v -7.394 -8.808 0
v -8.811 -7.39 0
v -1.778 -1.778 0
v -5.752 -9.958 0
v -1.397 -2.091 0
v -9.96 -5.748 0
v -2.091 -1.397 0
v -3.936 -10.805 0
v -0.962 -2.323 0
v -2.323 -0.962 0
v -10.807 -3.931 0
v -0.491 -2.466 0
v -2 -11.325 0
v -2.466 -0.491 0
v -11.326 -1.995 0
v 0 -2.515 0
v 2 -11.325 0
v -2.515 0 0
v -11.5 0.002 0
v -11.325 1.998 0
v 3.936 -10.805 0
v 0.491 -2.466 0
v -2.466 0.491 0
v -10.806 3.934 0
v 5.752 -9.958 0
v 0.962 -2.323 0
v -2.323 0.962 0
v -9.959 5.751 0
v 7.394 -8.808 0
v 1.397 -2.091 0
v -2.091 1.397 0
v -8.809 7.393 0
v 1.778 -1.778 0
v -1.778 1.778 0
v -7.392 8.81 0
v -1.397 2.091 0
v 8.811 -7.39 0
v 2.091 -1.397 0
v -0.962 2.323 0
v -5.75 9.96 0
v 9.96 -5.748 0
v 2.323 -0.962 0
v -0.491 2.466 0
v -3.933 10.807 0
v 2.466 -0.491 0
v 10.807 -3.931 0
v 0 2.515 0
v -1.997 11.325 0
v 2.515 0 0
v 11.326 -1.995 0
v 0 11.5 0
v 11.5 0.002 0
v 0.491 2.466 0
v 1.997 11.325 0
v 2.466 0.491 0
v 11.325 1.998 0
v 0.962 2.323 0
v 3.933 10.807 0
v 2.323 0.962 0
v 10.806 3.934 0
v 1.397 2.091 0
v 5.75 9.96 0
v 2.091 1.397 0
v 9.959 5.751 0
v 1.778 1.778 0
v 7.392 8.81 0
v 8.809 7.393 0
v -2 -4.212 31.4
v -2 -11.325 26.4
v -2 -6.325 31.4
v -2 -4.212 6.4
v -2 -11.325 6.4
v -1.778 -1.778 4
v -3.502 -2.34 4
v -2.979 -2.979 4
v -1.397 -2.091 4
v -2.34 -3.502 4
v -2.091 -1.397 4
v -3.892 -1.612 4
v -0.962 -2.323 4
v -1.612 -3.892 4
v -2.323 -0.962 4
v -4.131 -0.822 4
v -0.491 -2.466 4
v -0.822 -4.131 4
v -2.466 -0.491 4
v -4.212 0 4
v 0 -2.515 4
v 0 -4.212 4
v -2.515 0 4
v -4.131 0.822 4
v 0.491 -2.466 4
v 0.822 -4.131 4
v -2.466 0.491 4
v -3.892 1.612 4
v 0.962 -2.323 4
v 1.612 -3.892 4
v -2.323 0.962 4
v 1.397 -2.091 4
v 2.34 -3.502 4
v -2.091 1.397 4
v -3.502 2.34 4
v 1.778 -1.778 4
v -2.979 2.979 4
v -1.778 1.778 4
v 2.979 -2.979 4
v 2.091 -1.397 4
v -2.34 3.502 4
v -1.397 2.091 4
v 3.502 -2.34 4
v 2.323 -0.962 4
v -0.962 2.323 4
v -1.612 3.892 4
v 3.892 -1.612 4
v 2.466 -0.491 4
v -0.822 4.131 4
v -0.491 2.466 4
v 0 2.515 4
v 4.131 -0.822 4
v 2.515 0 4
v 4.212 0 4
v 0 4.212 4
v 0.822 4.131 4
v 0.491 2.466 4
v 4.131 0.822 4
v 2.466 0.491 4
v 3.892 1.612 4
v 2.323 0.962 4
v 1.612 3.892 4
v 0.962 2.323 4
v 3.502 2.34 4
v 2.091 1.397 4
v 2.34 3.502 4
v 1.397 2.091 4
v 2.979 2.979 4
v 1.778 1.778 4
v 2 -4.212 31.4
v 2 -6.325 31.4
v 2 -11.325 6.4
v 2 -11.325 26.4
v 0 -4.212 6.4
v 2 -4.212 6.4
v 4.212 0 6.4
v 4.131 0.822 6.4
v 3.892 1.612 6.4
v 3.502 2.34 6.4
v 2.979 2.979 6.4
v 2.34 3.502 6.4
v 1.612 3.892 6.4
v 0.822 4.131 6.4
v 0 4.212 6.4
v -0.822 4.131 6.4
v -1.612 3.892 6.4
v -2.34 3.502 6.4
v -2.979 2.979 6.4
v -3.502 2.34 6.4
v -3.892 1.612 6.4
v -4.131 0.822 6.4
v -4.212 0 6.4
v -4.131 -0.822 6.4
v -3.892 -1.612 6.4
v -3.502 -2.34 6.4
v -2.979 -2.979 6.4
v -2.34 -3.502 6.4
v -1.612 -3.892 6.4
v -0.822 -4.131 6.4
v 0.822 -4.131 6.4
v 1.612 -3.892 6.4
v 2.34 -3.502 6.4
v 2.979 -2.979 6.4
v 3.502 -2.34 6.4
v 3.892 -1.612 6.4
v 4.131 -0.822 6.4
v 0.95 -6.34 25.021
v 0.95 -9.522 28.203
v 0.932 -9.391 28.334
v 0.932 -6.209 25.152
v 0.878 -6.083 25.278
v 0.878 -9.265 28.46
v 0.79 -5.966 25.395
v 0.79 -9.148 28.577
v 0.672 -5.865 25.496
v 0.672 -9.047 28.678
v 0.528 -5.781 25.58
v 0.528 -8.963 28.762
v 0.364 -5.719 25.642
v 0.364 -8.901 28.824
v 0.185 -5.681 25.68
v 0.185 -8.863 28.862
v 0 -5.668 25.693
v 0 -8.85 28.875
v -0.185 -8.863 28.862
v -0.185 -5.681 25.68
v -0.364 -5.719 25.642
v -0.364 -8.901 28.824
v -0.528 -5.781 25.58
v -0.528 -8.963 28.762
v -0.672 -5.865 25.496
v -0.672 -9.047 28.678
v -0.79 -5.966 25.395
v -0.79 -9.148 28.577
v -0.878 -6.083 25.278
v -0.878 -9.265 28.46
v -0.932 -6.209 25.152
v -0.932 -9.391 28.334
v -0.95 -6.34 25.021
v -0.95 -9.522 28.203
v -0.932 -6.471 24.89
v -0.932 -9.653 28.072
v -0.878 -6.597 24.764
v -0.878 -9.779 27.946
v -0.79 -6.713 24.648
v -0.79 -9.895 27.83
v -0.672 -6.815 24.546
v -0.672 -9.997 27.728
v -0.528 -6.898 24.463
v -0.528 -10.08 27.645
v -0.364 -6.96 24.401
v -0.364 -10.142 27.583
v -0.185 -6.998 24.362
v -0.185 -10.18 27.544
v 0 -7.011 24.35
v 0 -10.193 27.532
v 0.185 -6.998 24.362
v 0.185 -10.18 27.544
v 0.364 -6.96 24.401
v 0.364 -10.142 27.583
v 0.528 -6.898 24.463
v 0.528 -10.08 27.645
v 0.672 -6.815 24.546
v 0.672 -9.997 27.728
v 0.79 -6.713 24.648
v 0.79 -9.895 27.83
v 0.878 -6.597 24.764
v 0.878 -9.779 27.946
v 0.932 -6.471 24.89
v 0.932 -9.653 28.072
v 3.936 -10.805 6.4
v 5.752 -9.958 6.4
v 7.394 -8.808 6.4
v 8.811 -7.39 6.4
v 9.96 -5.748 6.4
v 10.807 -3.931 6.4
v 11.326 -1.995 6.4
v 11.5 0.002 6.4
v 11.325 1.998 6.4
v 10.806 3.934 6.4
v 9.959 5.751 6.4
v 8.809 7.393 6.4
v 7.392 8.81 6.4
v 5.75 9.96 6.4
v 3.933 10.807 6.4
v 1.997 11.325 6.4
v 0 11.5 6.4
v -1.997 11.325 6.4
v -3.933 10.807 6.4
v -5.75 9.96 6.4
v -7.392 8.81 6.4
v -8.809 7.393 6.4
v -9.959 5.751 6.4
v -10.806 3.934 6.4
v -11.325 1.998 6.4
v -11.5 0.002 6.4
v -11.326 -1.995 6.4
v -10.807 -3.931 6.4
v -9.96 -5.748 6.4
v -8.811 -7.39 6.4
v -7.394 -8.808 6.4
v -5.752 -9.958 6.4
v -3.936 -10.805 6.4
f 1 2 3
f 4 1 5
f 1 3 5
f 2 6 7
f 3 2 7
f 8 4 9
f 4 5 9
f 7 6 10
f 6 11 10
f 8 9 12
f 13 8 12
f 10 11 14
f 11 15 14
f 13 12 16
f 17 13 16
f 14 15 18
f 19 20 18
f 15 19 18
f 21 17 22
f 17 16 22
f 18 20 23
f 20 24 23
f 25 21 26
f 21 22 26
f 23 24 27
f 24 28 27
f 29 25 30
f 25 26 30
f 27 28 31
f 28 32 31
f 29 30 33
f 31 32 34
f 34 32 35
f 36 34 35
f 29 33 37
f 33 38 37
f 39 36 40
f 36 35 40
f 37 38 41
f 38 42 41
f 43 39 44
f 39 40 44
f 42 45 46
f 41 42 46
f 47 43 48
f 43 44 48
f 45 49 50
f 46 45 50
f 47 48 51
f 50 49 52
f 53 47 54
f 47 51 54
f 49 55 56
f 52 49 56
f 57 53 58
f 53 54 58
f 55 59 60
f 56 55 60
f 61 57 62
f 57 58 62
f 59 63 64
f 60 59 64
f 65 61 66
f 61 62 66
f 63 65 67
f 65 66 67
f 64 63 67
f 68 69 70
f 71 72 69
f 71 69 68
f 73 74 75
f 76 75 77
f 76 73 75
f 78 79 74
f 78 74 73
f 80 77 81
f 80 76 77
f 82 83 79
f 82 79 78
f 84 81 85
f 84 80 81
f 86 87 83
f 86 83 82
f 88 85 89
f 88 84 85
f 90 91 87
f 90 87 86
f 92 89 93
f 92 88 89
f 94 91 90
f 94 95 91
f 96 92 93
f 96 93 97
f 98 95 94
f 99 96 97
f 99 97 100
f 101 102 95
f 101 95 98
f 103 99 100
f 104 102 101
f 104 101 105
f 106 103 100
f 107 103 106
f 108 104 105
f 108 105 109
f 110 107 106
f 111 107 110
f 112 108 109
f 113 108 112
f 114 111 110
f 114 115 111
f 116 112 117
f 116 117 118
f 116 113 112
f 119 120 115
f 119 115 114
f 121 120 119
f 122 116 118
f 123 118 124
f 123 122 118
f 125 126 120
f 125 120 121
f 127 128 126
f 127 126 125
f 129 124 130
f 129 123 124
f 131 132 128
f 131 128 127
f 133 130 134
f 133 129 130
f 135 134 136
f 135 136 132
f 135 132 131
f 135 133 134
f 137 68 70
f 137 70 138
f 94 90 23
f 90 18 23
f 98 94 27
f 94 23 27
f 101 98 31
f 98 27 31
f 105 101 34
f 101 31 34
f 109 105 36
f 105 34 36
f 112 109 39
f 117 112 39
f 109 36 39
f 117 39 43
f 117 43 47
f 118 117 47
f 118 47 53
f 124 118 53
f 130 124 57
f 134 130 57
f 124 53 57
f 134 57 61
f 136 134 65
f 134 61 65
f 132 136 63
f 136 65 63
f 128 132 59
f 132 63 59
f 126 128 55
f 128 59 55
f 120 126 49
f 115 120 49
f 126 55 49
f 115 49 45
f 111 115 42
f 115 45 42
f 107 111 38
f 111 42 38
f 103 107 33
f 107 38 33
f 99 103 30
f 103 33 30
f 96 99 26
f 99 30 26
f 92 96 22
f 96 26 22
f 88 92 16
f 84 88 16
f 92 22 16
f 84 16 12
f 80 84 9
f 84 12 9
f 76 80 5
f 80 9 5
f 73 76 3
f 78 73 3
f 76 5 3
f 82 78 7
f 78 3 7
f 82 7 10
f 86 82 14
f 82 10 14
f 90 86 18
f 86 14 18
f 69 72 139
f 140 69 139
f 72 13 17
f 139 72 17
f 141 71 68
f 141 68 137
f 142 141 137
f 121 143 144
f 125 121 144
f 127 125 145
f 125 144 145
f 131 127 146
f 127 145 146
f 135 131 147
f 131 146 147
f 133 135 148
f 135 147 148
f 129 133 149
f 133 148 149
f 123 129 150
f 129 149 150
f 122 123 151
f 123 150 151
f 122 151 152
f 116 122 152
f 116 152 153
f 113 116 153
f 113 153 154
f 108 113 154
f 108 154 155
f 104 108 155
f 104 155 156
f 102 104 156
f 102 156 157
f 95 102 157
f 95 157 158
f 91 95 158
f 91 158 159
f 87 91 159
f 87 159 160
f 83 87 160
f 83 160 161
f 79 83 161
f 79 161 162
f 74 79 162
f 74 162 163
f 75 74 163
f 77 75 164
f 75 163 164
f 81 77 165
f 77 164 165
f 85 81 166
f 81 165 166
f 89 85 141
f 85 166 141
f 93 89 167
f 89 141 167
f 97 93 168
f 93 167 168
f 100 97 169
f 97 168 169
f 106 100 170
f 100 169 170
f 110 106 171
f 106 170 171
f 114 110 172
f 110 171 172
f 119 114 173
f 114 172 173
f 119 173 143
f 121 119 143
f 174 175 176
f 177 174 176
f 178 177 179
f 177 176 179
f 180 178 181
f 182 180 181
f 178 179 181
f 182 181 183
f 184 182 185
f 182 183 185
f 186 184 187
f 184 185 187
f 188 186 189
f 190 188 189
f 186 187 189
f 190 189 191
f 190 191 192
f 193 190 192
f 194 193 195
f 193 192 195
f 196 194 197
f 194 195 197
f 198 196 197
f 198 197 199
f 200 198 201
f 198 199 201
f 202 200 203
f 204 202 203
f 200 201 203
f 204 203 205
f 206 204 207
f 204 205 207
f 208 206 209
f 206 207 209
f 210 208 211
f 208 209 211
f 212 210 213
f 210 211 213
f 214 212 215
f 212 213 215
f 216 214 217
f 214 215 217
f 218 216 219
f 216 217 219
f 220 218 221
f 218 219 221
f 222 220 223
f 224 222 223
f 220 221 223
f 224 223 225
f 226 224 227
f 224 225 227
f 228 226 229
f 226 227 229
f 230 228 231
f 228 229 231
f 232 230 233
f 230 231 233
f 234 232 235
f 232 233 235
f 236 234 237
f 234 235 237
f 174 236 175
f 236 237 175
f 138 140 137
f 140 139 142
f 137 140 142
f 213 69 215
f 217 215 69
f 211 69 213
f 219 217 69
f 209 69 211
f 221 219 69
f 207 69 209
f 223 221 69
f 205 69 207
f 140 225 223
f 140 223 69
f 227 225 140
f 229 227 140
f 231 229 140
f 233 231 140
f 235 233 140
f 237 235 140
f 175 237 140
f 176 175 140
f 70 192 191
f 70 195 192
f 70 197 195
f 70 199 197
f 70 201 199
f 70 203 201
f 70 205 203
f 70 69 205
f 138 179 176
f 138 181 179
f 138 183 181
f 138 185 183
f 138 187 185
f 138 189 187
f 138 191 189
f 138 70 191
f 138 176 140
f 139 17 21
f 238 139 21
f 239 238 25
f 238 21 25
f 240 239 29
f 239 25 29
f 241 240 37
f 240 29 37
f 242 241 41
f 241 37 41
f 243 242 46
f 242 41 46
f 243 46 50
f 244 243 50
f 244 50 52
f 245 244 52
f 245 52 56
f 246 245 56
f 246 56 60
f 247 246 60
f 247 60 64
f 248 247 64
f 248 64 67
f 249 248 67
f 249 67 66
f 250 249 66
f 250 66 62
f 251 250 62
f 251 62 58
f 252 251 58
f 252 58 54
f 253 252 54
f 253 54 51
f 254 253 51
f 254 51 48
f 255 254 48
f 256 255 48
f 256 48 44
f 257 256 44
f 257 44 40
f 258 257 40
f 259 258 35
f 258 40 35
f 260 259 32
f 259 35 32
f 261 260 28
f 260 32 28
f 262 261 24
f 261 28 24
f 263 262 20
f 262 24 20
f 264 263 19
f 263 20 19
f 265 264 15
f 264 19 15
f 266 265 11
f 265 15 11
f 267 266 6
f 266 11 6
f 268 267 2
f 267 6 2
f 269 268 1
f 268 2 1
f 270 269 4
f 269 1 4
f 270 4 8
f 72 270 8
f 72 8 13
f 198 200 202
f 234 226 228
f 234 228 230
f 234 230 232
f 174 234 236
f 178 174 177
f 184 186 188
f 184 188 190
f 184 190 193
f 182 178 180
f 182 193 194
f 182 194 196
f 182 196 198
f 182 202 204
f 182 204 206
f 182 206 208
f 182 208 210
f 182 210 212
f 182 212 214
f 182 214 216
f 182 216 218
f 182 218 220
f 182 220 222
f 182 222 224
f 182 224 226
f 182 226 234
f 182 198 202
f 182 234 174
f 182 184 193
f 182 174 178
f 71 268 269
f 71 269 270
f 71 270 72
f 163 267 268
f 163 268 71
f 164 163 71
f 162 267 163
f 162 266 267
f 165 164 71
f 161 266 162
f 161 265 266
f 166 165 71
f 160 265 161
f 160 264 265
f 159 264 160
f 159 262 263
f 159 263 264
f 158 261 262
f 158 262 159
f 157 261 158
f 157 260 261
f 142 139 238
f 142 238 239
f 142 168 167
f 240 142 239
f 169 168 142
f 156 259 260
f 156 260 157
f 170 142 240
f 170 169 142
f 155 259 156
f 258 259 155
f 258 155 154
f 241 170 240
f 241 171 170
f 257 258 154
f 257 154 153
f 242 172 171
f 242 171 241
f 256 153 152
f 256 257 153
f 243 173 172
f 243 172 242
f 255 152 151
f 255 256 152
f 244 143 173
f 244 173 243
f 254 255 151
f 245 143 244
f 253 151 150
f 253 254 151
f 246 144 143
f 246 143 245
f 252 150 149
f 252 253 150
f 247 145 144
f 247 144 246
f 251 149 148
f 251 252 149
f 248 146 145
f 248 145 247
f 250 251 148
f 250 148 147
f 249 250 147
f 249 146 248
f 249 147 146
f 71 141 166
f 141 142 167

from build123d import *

# Parameters (mm, degrees)
SKETCH_R         = 11.5
PAD_DEPTH        = 6.4002
HOLE_D           = 5.0292
HOLE_CBORE_D     = 8.4248
HOLE_CBORE_DEPTH = 2.4002
SKETCH002_W      = 4
SKETCH002_H      = 7.112352
PAD001_DEPTH     = 25
CHAMFER_ANGLE    = 45
CHAMFER_SIZE     = 5
SKETCH003_R      = 0.95
POCKET_DEPTH     = 4.5
POCKET001_DEPTH  = 6.4012


with BuildPart() as part:
    # Sketch → Pad (new body)
    with BuildSketch(Plane.XY):
        Circle(SKETCH_R)
    extrude(amount=PAD_DEPTH)

    # Hole (through all)
    with Locations(Plane.XY.offset(6.4002)):
        with Locations((0, 0)):
            CounterBoreHole(HOLE_D / 2, HOLE_CBORE_D / 2, HOLE_CBORE_DEPTH)

    # Sketch002 (on DatumPlane) → Pad001 (join)
    with BuildSketch(Plane.XY.offset(6.4002)):
        with Locations((0, -7.768576)):
            Rectangle(SKETCH002_W, SKETCH002_H)
    extrude(amount=PAD001_DEPTH)

    # Chamfer
    chamfer_edges = [part.edges().sort_by_distance(p)[0] for p in [
        (0, -11.324752, 31.4002),
    ]]
    chamfer_side = part.faces().sort_by_distance((0, -11.324752, 18.9002))[0]
    chamfer(chamfer_edges, length=CHAMFER_SIZE, angle=CHAMFER_ANGLE, reference=chamfer_side)

    # Sketch003 (on Face3 of Chamfer) → Pocket (cut)
    with BuildSketch(Plane(origin=(0, -18.862476, 18.862476), x_dir=(1, 0, 0), z_dir=(0, -0.707107, 0.707107))):
        with Locations((0, 13.209952)):
            Circle(SKETCH003_R)
    extrude(amount=-POCKET_DEPTH, mode=Mode.SUBTRACT)

    # Sketch004 (on DatumPlane) → Pocket001 (cut, through all)
    with BuildSketch(Plane.XY.offset(6.4002)):
        with BuildLine():
            ThreePointArc((-2, -11.324752), (0, -11.5), (2, -11.324752))
            Line((-2, -11.324752), (2, -11.324752))
        make_face()
    extrude(amount=-POCKET001_DEPTH, mode=Mode.SUBTRACT)


solid = part.part
